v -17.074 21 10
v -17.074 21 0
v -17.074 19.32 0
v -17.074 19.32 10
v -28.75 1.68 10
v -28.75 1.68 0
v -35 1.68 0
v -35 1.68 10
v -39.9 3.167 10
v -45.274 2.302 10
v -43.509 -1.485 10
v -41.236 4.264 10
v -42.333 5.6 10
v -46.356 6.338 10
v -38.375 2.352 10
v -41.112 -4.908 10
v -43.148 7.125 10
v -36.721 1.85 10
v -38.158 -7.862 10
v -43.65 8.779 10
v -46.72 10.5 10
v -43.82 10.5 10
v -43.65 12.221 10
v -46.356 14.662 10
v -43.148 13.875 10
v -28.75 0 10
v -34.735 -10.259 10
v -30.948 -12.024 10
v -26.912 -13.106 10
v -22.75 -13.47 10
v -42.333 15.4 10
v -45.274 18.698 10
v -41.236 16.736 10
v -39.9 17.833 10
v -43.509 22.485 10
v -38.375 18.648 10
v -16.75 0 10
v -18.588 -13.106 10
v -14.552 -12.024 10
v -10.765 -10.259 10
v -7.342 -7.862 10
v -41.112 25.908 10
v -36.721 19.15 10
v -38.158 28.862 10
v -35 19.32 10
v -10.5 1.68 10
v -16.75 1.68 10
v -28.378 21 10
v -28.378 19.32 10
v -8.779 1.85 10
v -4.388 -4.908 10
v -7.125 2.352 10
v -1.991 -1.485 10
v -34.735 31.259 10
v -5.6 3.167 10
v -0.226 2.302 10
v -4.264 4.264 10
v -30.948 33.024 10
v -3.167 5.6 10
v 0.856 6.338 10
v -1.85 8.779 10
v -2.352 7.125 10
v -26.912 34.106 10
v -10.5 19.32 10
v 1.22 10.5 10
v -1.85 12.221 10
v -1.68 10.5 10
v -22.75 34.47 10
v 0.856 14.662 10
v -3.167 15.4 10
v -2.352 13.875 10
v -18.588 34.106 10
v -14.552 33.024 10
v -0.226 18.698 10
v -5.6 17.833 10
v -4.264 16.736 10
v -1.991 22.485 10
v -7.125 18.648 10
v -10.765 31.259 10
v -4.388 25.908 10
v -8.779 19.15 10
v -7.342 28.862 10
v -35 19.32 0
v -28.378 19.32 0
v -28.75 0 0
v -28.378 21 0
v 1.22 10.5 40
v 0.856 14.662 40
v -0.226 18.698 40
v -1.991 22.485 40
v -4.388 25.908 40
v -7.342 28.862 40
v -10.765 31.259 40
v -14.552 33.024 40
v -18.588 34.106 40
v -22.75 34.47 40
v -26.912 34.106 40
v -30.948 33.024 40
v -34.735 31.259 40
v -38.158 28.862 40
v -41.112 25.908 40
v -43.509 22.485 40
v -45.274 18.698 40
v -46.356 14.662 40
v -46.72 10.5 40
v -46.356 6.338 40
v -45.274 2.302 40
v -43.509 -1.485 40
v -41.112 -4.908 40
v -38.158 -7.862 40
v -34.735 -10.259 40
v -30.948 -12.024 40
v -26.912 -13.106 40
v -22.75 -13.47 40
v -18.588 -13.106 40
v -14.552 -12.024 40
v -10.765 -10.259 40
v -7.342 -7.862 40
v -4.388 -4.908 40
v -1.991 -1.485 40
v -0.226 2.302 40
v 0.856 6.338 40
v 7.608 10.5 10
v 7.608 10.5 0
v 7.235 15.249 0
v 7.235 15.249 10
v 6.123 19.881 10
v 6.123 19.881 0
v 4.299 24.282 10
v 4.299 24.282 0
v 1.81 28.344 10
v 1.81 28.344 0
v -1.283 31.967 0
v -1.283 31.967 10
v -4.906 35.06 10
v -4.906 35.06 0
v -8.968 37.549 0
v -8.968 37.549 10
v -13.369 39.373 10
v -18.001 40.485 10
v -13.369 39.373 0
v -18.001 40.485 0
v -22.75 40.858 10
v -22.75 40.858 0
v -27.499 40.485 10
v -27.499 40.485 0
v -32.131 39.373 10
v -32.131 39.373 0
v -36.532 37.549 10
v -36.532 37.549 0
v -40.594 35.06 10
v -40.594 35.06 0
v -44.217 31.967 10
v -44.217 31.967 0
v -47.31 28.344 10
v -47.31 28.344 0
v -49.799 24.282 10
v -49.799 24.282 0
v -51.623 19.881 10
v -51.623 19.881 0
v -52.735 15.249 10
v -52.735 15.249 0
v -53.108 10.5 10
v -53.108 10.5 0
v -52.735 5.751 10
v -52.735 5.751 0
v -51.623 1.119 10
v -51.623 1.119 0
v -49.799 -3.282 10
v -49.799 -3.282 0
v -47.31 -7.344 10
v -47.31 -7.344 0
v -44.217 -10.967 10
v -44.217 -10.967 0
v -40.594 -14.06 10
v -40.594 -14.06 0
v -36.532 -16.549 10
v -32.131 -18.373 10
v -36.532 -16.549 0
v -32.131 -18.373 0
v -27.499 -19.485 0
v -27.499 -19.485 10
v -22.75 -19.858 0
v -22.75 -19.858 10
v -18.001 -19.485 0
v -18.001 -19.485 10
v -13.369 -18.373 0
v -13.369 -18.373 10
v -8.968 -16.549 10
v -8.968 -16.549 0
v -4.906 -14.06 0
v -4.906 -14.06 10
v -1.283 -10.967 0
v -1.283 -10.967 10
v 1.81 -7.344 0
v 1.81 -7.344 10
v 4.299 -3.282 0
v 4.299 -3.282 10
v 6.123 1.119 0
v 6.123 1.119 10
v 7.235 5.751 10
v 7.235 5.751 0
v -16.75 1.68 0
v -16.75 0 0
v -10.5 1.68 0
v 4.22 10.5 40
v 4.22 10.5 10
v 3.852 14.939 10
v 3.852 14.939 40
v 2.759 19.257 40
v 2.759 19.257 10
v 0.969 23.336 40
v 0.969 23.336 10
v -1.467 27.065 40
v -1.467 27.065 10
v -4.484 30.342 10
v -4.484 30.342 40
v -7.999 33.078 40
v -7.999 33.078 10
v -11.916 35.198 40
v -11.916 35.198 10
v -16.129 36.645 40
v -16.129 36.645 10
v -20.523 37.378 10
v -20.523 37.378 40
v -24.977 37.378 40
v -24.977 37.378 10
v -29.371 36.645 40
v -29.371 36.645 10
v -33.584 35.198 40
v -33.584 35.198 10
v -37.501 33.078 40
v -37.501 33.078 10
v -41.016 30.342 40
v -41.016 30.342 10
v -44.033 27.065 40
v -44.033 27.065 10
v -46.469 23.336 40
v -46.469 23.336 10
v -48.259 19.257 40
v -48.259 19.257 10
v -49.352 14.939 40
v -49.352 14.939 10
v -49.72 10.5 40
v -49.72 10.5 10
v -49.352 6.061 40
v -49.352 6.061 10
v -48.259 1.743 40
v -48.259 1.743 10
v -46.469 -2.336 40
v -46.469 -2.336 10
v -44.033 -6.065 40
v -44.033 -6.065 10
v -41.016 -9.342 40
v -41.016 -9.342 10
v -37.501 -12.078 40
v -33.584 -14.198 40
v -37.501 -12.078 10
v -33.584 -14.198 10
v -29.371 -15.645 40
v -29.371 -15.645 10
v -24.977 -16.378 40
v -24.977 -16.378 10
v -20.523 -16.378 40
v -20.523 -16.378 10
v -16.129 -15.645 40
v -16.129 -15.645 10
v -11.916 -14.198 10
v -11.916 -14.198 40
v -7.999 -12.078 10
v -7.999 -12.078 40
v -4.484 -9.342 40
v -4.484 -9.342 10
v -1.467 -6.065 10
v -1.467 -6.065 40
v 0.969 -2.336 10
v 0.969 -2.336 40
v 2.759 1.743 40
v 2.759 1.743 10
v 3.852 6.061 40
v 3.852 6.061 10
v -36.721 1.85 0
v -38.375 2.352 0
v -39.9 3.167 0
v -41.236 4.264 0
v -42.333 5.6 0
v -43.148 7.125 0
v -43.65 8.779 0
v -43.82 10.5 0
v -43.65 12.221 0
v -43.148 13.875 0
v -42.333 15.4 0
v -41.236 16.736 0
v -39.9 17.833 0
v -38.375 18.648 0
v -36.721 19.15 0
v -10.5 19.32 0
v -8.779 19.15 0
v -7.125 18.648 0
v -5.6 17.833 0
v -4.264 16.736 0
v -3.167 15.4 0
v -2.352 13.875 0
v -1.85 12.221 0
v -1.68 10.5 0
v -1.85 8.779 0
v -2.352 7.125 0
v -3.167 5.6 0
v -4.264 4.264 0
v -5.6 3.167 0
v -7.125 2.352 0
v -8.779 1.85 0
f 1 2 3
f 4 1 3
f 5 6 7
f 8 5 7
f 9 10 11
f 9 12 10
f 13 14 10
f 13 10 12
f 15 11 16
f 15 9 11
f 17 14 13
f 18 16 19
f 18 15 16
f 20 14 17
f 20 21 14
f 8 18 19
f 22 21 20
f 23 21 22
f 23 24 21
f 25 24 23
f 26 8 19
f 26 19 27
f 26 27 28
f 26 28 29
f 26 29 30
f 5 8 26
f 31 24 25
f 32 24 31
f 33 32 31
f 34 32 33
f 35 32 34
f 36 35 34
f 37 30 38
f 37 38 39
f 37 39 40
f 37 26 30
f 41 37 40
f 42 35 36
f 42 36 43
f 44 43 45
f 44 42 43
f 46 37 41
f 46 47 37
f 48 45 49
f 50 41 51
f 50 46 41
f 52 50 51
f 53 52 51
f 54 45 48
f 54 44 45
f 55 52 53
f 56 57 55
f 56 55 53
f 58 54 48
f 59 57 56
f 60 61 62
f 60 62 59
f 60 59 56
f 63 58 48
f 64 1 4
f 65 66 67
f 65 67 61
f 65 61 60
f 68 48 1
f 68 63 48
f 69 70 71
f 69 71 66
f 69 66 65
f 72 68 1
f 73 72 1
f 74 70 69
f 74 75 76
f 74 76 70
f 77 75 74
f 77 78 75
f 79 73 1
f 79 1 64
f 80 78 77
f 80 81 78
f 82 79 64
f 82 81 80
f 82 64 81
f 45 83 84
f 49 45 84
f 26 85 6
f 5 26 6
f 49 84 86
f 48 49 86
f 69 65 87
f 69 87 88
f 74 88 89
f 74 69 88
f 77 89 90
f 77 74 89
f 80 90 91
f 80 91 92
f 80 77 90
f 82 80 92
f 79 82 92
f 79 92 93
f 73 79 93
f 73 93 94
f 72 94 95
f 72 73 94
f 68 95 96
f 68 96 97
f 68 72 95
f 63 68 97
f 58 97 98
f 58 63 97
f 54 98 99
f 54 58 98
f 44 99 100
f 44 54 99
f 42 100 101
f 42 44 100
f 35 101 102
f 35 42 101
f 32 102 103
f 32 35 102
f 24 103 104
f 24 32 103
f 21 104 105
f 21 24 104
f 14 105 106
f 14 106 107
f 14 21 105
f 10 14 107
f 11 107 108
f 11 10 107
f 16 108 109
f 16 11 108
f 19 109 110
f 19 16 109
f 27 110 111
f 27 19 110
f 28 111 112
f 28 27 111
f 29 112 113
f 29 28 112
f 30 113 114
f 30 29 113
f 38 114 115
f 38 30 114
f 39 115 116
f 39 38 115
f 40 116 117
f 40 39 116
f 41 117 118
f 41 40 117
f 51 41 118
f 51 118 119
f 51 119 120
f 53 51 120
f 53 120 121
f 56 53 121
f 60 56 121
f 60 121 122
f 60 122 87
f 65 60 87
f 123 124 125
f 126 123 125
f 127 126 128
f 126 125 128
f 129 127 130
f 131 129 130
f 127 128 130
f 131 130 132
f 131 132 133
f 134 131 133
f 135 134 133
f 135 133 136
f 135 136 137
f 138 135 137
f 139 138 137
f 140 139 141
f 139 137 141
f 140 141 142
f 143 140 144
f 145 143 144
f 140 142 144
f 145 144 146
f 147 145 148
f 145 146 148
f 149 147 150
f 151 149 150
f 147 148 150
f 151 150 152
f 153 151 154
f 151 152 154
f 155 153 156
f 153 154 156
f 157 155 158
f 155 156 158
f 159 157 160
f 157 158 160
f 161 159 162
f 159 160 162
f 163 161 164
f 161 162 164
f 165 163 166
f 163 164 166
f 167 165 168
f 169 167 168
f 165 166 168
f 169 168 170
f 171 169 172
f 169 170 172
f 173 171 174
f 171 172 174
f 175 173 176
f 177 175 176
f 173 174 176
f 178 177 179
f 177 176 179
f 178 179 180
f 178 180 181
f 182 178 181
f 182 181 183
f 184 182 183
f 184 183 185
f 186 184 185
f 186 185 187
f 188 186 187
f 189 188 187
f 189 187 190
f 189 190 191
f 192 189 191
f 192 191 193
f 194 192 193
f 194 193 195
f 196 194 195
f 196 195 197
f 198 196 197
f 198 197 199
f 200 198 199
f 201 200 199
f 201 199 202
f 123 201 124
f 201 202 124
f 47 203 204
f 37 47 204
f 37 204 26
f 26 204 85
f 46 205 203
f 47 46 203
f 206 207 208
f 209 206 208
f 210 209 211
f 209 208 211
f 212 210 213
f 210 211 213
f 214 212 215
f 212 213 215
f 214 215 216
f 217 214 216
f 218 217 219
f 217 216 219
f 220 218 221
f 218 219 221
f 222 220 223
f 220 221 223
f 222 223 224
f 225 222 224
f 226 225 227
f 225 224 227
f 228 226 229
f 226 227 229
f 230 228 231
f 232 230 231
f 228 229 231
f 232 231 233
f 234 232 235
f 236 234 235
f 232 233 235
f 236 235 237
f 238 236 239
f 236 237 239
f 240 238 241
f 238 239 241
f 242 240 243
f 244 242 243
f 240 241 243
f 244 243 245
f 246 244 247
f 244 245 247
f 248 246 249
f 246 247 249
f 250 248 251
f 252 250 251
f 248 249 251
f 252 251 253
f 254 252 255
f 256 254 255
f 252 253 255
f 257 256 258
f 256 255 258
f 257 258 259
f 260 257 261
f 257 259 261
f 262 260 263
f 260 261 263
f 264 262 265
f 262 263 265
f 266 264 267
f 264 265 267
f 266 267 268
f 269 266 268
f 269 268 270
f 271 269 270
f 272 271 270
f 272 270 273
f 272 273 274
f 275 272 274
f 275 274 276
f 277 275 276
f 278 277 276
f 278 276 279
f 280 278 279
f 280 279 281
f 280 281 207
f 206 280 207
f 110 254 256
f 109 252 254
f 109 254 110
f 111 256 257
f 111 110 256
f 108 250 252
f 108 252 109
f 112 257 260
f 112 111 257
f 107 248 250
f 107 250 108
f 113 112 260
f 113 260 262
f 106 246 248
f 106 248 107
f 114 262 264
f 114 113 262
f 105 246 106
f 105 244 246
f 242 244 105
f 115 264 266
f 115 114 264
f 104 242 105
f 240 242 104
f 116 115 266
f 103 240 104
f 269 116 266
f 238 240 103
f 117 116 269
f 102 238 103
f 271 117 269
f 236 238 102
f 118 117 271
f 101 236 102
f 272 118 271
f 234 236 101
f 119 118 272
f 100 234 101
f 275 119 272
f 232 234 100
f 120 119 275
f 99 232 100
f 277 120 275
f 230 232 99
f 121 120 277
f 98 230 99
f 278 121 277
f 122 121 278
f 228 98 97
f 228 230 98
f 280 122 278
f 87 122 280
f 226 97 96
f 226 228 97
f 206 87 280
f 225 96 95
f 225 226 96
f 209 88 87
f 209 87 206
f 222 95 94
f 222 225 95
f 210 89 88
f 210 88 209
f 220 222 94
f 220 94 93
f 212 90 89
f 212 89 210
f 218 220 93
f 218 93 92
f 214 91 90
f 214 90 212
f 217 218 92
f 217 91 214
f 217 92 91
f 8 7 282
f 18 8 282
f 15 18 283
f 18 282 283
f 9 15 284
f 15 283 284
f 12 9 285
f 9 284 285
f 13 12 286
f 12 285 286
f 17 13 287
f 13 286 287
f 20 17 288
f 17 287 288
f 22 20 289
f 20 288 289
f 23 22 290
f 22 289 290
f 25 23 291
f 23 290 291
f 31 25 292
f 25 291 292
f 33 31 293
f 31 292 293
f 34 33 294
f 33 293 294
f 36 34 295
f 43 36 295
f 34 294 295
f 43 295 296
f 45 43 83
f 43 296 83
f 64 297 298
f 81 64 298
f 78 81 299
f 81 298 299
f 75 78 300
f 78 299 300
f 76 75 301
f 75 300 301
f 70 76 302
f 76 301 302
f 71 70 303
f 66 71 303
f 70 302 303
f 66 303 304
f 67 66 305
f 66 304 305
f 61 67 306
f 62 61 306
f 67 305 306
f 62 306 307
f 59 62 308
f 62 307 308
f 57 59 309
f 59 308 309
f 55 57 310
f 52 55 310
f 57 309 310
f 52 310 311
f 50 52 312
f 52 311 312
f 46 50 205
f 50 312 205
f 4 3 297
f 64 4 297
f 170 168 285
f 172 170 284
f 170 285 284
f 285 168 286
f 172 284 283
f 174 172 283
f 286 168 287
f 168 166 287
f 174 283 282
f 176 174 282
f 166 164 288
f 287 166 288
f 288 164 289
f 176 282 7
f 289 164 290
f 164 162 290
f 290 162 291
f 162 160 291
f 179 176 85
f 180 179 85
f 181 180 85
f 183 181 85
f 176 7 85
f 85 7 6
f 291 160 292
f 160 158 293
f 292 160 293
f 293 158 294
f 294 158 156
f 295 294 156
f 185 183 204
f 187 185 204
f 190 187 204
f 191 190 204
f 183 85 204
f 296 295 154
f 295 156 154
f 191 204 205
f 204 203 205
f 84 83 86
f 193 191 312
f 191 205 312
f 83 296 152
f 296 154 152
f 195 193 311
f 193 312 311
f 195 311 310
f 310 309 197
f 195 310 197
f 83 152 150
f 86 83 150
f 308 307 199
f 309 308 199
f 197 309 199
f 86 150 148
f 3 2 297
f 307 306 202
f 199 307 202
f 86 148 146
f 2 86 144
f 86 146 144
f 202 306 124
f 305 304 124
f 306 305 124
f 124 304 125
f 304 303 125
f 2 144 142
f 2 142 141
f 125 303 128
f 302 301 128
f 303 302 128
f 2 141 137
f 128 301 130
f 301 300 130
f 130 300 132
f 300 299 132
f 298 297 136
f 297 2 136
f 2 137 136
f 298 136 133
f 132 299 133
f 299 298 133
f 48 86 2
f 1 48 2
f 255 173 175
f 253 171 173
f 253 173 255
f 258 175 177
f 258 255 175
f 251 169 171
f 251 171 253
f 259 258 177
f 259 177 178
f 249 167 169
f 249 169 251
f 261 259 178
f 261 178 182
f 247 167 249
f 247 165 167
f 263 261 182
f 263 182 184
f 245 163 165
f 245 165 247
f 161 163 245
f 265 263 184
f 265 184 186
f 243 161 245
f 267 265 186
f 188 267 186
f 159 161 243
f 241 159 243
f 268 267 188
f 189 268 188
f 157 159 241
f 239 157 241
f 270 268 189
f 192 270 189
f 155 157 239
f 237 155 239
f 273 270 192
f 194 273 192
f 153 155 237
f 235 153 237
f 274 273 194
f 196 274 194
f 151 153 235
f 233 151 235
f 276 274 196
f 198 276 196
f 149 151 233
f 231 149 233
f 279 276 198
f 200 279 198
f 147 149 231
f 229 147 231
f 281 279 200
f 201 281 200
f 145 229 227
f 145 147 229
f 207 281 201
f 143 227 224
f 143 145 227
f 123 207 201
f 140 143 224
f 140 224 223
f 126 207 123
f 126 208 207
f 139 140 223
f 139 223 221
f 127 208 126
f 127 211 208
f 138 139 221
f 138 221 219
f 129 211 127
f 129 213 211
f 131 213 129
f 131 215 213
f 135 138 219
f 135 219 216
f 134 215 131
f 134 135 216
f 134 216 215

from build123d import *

# Parameters (mm, degrees)
SKETCH3_R           = 30.358351357
BOSS_EXTRUDE2_DEPTH = 10
SKETCH4_R           = 26.969977479
SKETCH4_R_2         = 23.969977479
BOSS_EXTRUDE3_DEPTH = 30


with BuildPart() as part:
    # Sketch3 → Boss-Extrude2 (new body)
    with BuildSketch(Plane.XY):
        with Locations((-22.75, 10.5)):
            Circle(SKETCH3_R)
        with BuildLine():
            ThreePointArc((-35, 1.680276087), (-43.819723913, 10.5), (-35, 19.319723913))
            Line((-35, 19.319723913), (-28.378131485, 19.319723913))
            Line((-28.378131485, 19.319723913), (-28.378131485, 21))
            Line((-28.378131485, 21), (-17.074172485, 21))
            Line((-17.074172485, 21), (-17.074172485, 19.319723913))
            Line((-17.074172485, 19.319723913), (-10.5, 19.319723913))
            ThreePointArc((-10.5, 19.319723913), (-1.680276087, 10.5), (-10.5, 1.680276087))
            Line((-10.5, 1.680276087), (-16.75, 1.680276087))
            Line((-16.75, 1.680276087), (-16.75, 0))
            Line((-16.75, 0), (-28.75, 0))
            Line((-28.75, 0), (-28.75, 1.680276087))
            Line((-28.75, 1.680276087), (-35, 1.680276087))
        make_face(mode=Mode.SUBTRACT)
    extrude(amount=BOSS_EXTRUDE2_DEPTH)

    # Sketch4 → Boss-Extrude3 (add)
    with BuildSketch(Plane.XY.offset(10)):
        with Locations((-22.75, 10.5)):
            Circle(SKETCH4_R)
        with Locations((-22.75, 10.5)):
            Circle(SKETCH4_R_2, mode=Mode.SUBTRACT)
    extrude(amount=BOSS_EXTRUDE3_DEPTH)


solid = part.part
